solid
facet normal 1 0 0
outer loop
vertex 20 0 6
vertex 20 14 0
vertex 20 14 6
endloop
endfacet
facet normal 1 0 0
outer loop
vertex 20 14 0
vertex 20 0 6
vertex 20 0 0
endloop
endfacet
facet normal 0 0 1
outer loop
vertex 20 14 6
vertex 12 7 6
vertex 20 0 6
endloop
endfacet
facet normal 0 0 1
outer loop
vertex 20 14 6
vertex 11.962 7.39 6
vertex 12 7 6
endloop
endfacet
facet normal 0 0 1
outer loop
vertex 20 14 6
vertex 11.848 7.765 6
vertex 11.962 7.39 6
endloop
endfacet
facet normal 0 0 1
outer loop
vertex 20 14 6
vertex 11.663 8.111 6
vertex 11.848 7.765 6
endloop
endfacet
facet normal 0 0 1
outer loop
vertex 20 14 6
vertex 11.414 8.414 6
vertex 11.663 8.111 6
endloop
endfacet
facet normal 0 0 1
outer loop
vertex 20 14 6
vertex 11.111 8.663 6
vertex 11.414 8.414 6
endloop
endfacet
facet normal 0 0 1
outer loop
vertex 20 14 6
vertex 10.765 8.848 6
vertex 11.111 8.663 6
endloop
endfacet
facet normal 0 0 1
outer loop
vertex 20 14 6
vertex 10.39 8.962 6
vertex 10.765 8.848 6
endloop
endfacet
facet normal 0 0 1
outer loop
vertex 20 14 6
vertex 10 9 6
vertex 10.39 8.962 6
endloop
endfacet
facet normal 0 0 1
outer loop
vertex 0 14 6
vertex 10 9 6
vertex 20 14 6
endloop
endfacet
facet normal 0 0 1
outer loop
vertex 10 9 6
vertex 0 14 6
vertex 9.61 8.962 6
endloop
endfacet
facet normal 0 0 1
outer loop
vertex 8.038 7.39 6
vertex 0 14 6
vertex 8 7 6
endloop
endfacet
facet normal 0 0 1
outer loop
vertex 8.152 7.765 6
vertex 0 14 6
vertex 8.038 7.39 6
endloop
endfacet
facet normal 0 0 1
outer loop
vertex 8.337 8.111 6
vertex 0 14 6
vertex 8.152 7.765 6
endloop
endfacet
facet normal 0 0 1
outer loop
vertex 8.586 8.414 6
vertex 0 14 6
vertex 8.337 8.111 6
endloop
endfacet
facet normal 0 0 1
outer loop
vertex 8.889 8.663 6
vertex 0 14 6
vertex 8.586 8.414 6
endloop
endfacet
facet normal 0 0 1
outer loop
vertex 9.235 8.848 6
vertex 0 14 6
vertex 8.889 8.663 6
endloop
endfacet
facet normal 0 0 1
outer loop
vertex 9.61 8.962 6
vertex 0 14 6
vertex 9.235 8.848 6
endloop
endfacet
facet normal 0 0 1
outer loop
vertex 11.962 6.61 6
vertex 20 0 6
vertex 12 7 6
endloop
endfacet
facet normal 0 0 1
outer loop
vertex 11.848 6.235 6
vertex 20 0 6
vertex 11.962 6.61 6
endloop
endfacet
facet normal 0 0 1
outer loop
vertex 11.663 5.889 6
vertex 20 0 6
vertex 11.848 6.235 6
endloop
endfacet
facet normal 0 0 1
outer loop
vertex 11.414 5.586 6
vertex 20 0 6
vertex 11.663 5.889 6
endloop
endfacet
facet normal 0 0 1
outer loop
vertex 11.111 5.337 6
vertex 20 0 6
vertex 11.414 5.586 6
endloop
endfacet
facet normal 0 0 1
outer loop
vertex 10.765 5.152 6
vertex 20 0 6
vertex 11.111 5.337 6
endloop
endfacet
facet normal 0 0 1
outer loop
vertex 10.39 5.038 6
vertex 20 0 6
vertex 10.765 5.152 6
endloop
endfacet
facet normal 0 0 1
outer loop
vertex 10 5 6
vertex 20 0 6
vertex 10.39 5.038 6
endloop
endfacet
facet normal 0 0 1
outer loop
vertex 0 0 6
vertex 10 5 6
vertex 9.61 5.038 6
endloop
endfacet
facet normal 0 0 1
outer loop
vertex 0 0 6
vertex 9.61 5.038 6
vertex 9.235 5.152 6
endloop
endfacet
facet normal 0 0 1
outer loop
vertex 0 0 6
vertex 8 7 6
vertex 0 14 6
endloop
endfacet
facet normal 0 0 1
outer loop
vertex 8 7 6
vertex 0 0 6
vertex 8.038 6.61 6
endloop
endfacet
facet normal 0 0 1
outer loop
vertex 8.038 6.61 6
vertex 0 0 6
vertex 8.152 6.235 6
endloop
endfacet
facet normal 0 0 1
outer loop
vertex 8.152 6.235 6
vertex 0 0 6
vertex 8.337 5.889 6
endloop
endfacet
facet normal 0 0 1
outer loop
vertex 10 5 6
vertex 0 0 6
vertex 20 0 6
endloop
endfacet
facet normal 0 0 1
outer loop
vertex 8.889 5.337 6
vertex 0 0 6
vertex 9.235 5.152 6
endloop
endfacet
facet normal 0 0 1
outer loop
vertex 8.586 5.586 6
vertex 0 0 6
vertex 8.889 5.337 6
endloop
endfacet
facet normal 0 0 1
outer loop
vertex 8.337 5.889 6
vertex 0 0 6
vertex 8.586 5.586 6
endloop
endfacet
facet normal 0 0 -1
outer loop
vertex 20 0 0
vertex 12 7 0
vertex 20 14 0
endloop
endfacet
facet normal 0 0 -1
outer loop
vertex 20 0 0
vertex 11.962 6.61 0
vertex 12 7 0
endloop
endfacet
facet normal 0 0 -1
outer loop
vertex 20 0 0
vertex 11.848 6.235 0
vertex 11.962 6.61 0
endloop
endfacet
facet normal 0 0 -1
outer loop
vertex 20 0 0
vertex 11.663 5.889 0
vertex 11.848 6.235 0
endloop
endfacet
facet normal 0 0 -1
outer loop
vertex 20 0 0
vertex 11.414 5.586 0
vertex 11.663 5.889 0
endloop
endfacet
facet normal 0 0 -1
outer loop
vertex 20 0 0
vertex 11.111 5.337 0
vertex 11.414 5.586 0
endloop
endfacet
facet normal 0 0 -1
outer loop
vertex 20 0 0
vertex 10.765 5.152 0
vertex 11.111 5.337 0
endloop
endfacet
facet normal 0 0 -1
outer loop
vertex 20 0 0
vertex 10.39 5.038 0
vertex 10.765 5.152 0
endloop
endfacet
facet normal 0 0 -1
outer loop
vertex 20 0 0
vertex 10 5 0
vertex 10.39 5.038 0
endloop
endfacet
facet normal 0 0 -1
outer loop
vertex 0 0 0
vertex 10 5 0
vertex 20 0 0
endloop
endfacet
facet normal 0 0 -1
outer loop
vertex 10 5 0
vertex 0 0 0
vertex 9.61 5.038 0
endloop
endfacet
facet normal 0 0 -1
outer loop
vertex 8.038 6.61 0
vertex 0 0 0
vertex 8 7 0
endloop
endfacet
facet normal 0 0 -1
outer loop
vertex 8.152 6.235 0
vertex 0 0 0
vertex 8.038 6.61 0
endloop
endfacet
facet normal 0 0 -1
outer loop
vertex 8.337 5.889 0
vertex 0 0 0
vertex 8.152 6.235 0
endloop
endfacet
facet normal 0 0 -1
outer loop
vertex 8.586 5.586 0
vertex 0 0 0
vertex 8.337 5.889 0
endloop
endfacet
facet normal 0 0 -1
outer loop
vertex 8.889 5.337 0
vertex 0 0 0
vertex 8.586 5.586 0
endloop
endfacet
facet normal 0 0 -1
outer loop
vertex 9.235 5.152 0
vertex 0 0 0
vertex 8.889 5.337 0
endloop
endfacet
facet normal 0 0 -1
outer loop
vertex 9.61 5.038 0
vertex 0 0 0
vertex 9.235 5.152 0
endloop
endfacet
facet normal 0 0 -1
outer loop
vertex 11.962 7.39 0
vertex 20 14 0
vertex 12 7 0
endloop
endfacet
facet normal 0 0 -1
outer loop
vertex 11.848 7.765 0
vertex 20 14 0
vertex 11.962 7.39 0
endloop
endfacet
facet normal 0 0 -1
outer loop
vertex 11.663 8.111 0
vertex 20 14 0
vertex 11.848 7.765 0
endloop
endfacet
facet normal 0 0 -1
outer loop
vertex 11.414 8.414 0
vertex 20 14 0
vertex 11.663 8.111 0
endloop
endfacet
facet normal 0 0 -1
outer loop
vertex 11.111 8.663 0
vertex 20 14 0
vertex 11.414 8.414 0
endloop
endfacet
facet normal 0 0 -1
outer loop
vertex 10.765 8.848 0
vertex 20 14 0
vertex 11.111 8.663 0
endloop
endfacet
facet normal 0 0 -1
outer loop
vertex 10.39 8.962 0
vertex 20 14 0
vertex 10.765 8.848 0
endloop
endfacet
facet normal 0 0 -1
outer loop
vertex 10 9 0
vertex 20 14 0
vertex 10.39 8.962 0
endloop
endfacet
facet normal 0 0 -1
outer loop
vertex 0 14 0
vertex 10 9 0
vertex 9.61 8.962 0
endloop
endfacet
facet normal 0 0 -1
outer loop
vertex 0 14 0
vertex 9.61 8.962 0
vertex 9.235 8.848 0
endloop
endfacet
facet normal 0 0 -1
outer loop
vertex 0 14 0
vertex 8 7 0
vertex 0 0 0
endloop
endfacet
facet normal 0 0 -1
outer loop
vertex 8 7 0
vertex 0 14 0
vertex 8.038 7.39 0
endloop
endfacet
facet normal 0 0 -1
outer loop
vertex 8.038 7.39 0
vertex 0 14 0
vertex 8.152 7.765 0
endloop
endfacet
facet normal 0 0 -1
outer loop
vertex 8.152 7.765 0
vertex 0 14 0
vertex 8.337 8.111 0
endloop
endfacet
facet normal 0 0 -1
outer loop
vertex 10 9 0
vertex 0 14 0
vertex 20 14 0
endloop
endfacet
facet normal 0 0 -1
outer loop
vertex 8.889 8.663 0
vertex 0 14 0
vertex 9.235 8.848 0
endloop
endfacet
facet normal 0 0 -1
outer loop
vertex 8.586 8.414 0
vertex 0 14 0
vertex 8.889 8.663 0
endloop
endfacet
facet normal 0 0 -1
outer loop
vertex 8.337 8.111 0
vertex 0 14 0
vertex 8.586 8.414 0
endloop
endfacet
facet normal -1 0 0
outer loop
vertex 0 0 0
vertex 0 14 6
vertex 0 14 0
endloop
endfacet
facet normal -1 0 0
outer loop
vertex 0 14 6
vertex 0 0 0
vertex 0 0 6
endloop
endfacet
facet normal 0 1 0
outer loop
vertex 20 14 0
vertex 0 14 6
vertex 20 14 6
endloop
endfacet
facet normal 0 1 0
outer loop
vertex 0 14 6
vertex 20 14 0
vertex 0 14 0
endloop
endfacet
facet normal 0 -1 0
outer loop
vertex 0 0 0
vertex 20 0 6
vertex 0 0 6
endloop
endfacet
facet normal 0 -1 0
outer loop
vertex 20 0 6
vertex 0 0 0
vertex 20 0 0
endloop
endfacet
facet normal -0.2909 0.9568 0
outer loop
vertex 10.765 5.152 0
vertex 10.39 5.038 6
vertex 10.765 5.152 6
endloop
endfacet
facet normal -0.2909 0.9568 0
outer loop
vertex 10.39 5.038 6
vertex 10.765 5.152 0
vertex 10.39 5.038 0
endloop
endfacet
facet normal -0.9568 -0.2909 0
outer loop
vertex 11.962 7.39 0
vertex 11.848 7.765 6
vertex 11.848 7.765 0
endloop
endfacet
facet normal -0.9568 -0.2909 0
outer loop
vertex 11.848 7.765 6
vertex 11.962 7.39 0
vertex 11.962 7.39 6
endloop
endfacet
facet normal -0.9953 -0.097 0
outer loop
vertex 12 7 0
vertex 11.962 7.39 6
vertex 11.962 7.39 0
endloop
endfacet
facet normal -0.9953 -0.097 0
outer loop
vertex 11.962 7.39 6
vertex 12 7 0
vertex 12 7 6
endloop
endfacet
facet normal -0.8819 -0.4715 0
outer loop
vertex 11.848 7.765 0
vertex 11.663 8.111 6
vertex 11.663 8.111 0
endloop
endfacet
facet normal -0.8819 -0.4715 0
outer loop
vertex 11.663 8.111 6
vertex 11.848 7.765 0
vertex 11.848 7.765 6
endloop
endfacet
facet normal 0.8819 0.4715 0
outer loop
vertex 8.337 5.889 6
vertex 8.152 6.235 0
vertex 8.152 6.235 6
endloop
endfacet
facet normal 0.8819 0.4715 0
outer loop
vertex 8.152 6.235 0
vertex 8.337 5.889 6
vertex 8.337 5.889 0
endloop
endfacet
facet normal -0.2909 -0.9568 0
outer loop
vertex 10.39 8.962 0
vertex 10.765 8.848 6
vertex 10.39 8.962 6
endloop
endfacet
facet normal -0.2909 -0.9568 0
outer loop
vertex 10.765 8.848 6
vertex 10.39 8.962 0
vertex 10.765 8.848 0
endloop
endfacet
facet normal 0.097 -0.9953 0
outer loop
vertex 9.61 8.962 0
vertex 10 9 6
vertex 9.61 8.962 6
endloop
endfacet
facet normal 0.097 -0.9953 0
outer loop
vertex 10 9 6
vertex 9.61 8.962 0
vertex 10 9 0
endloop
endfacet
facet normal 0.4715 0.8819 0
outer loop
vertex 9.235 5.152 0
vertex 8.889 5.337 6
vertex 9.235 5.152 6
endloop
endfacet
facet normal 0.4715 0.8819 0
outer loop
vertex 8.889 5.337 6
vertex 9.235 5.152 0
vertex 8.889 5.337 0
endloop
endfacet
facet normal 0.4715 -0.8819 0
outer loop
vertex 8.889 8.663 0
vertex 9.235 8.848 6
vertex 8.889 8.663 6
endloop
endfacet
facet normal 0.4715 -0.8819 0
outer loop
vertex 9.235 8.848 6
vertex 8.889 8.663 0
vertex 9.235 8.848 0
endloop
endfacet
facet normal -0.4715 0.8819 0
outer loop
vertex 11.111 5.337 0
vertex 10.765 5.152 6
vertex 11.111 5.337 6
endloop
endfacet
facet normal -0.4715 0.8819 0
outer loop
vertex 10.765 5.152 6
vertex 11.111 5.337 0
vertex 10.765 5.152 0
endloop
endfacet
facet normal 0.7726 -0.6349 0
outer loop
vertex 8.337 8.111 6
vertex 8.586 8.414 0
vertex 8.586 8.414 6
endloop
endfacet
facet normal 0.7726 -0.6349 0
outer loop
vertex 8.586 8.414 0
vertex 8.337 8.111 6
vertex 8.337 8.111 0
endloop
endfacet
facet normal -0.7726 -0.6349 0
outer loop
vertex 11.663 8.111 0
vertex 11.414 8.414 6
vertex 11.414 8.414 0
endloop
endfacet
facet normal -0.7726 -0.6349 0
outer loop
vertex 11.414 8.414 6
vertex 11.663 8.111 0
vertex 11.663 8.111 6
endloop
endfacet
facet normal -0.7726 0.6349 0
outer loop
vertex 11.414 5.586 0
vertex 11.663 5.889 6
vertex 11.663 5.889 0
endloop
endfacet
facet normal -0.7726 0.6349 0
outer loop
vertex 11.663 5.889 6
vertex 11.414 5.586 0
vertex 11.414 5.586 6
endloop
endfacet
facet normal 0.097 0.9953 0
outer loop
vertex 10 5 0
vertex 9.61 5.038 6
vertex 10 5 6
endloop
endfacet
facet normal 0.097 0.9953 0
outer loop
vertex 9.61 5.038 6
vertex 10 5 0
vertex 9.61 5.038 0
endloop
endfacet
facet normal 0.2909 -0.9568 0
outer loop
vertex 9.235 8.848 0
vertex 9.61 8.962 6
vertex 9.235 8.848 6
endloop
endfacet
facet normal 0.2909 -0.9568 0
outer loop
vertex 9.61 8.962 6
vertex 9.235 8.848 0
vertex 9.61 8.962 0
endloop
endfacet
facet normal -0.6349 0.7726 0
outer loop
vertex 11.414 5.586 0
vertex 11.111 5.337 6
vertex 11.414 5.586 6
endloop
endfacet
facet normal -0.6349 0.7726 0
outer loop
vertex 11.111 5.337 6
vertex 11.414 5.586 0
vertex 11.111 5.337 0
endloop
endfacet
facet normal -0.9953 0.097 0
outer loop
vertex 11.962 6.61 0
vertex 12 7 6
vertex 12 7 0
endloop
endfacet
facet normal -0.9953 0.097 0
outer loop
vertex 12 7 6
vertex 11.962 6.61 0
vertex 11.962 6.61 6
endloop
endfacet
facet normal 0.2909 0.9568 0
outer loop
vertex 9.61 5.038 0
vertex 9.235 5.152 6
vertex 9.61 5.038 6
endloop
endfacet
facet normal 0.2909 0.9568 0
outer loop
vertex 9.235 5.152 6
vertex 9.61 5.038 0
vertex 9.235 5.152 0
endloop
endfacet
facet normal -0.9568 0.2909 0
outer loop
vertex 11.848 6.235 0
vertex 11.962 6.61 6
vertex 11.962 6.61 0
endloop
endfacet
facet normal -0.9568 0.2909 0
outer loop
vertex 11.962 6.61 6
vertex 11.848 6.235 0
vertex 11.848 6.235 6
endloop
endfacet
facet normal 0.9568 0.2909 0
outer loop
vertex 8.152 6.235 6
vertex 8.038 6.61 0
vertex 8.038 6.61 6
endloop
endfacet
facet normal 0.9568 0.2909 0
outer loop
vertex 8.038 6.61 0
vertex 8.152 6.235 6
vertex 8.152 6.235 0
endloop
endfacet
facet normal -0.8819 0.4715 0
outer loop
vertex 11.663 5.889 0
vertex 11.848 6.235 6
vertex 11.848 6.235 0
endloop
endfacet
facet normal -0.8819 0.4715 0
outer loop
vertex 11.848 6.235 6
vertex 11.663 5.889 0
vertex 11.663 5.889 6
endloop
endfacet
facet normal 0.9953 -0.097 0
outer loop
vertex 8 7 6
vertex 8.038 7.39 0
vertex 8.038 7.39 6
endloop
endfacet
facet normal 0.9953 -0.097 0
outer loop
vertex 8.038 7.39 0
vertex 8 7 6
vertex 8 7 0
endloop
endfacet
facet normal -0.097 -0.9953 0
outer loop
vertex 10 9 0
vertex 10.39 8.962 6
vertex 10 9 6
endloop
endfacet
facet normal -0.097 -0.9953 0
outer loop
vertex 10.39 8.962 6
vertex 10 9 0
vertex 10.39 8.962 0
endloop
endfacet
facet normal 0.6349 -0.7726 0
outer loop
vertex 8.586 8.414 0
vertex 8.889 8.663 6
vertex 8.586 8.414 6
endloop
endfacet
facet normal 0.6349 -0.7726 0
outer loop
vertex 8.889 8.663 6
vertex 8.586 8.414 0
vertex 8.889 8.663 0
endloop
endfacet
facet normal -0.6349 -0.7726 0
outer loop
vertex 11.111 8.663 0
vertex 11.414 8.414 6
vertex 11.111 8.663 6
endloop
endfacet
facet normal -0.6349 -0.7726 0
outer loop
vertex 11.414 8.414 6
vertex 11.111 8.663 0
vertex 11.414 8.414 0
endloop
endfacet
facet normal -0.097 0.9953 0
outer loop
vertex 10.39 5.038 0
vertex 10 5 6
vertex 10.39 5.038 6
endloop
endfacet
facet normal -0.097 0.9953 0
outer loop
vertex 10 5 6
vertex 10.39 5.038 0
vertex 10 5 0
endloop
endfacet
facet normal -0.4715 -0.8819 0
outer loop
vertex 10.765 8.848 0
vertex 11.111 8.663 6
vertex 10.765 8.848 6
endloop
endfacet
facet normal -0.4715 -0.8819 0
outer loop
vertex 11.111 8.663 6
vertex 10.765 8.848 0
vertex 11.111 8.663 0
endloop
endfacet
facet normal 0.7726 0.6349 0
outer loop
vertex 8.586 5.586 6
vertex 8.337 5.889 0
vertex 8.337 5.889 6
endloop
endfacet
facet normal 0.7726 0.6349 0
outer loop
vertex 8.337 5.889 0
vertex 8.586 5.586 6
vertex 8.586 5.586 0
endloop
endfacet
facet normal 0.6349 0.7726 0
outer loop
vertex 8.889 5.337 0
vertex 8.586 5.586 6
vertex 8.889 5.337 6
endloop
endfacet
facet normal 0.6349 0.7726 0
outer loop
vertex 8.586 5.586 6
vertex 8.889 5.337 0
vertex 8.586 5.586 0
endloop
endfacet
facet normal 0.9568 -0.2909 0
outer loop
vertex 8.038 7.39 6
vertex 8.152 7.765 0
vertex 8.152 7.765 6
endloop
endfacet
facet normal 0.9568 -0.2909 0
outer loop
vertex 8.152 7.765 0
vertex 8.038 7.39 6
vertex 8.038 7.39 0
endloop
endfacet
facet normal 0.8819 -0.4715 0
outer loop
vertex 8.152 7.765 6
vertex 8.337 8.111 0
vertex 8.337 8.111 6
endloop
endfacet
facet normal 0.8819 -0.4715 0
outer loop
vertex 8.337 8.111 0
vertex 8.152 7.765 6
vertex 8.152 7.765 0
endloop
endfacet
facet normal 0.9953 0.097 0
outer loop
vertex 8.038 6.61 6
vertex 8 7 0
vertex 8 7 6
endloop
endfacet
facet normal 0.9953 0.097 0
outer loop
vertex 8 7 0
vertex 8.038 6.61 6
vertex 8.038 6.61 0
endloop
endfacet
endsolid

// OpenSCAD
$fn = 32;

// ----------------------------------------------------------------------
// Micro pad: drilled pad, 5-20 mm class
// ----------------------------------------------------------------------

// --- parameters (mm) ---
pad_l = 20;               // pad length, X
pad_w = 14;               // pad width, Y
pad_t = 6;                // pad thickness, Z
hole_d = 4;               // through hole diameter

difference() {
  cube([pad_l, pad_w, pad_t]);
  translate([pad_l / 2, pad_w / 2, -1])
    cylinder(h = pad_t + 2, d = hole_d);
}
